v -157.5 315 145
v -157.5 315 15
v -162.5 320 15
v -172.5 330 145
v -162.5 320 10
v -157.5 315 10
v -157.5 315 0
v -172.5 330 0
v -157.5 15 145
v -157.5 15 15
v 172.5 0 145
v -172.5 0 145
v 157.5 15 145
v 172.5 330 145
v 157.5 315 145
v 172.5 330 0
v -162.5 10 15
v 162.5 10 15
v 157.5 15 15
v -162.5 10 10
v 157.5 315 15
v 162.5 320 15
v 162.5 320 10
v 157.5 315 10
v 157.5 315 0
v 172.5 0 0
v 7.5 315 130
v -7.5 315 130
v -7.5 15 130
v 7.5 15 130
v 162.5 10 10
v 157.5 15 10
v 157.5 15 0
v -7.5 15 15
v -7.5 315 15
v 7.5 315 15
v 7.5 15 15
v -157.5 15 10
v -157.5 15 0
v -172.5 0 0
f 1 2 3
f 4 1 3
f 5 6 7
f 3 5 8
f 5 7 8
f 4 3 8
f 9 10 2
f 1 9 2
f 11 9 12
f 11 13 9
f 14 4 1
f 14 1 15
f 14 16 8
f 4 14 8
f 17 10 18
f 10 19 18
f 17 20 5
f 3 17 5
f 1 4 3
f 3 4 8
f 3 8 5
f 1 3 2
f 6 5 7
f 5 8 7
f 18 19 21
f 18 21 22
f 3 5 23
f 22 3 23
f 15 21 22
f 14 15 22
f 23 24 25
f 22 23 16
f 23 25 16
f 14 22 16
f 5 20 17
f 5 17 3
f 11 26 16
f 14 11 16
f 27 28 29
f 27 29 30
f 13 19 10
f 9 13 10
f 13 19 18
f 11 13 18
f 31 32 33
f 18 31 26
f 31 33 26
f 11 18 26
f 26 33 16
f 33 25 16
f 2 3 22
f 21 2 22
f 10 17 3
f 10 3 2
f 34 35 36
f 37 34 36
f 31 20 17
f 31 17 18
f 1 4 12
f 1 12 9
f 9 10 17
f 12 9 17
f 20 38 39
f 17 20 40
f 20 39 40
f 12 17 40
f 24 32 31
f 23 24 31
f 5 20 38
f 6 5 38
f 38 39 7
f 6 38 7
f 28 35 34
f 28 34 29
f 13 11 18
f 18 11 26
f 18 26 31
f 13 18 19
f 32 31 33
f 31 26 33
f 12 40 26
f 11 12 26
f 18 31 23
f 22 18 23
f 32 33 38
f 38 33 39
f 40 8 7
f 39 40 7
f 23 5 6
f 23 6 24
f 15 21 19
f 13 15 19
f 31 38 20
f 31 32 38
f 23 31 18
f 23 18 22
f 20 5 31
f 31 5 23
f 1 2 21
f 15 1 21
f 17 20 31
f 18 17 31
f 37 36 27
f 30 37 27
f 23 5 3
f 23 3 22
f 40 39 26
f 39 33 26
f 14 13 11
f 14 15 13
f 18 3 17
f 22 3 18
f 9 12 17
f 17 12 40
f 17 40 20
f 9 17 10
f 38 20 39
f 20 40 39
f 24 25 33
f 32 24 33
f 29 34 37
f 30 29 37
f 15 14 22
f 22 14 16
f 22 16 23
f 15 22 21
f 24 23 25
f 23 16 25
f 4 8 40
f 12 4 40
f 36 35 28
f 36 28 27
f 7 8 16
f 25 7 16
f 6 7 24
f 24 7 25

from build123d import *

# Parameters (mm, degrees)
F3_W      = 325
F3_H      = 310
F4_DEPTH  = 5
F6_DEPTH  = 145
F7_DEPTH  = 145
F10_W     = 15
F10_H     = 115
F11_DEPTH = 300


with BuildPart() as f4:
    # F3 (on plane+point) → F4 (new body, through all)
    with BuildSketch(Plane.XY.offset(10)):
        with Locations((0, 165)):
            Rectangle(F3_W, F3_H)
    extrude(amount=F4_DEPTH)


with BuildPart() as f6:
    # F5 (on Top) → F6 (new body, through all)
    with BuildSketch(Plane.XY):
        Polygon((-172.5, 330), (-172.5, 0), (-157.5, 15), (-157.5, 315), align=None)
    extrude(amount=F6_DEPTH)

    # F8: cut F4
    add(f4.part, mode=Mode.SUBTRACT)


with BuildPart() as f6b:
    # F5 (on Top) → F6, piece 2 (new body, through all)
    with BuildSketch(Plane.XY):
        Polygon((157.5, 15), (172.5, 0), (172.5, 330), (157.5, 315), align=None)
    extrude(amount=F6_DEPTH)

    # F8: cut F4
    add(f4.part, mode=Mode.SUBTRACT)


with BuildPart() as f7:
    # F5 (on Top) → F7 (new body, through all)
    with BuildSketch(Plane.XY):
        Polygon((172.5, 330), (-172.5, 330), (-157.5, 315), (157.5, 315), align=None)
    extrude(amount=F7_DEPTH)

    # F9: cut F4
    add(f4.part, mode=Mode.SUBTRACT)


with BuildPart() as f7b:
    # F5 (on Top) → F7, piece 2 (new body, through all)
    with BuildSketch(Plane.XY):
        Polygon((-157.5, 15), (-172.5, 0), (172.5, 0), (157.5, 15), align=None)
    extrude(amount=F7_DEPTH)

    # F9: cut F4
    add(f4.part, mode=Mode.SUBTRACT)


with BuildPart() as f11:
    # F10 (on face) → F11 (new body, through all)
    with BuildSketch(Plane.XZ.offset(-315)):
        with Locations((0, 72.5)):
            Rectangle(F10_W, F10_H)
    extrude(amount=F11_DEPTH)


solid = Compound([f4.part, f6.part, f6b.part, f7.part, f7b.part, f11.part])
